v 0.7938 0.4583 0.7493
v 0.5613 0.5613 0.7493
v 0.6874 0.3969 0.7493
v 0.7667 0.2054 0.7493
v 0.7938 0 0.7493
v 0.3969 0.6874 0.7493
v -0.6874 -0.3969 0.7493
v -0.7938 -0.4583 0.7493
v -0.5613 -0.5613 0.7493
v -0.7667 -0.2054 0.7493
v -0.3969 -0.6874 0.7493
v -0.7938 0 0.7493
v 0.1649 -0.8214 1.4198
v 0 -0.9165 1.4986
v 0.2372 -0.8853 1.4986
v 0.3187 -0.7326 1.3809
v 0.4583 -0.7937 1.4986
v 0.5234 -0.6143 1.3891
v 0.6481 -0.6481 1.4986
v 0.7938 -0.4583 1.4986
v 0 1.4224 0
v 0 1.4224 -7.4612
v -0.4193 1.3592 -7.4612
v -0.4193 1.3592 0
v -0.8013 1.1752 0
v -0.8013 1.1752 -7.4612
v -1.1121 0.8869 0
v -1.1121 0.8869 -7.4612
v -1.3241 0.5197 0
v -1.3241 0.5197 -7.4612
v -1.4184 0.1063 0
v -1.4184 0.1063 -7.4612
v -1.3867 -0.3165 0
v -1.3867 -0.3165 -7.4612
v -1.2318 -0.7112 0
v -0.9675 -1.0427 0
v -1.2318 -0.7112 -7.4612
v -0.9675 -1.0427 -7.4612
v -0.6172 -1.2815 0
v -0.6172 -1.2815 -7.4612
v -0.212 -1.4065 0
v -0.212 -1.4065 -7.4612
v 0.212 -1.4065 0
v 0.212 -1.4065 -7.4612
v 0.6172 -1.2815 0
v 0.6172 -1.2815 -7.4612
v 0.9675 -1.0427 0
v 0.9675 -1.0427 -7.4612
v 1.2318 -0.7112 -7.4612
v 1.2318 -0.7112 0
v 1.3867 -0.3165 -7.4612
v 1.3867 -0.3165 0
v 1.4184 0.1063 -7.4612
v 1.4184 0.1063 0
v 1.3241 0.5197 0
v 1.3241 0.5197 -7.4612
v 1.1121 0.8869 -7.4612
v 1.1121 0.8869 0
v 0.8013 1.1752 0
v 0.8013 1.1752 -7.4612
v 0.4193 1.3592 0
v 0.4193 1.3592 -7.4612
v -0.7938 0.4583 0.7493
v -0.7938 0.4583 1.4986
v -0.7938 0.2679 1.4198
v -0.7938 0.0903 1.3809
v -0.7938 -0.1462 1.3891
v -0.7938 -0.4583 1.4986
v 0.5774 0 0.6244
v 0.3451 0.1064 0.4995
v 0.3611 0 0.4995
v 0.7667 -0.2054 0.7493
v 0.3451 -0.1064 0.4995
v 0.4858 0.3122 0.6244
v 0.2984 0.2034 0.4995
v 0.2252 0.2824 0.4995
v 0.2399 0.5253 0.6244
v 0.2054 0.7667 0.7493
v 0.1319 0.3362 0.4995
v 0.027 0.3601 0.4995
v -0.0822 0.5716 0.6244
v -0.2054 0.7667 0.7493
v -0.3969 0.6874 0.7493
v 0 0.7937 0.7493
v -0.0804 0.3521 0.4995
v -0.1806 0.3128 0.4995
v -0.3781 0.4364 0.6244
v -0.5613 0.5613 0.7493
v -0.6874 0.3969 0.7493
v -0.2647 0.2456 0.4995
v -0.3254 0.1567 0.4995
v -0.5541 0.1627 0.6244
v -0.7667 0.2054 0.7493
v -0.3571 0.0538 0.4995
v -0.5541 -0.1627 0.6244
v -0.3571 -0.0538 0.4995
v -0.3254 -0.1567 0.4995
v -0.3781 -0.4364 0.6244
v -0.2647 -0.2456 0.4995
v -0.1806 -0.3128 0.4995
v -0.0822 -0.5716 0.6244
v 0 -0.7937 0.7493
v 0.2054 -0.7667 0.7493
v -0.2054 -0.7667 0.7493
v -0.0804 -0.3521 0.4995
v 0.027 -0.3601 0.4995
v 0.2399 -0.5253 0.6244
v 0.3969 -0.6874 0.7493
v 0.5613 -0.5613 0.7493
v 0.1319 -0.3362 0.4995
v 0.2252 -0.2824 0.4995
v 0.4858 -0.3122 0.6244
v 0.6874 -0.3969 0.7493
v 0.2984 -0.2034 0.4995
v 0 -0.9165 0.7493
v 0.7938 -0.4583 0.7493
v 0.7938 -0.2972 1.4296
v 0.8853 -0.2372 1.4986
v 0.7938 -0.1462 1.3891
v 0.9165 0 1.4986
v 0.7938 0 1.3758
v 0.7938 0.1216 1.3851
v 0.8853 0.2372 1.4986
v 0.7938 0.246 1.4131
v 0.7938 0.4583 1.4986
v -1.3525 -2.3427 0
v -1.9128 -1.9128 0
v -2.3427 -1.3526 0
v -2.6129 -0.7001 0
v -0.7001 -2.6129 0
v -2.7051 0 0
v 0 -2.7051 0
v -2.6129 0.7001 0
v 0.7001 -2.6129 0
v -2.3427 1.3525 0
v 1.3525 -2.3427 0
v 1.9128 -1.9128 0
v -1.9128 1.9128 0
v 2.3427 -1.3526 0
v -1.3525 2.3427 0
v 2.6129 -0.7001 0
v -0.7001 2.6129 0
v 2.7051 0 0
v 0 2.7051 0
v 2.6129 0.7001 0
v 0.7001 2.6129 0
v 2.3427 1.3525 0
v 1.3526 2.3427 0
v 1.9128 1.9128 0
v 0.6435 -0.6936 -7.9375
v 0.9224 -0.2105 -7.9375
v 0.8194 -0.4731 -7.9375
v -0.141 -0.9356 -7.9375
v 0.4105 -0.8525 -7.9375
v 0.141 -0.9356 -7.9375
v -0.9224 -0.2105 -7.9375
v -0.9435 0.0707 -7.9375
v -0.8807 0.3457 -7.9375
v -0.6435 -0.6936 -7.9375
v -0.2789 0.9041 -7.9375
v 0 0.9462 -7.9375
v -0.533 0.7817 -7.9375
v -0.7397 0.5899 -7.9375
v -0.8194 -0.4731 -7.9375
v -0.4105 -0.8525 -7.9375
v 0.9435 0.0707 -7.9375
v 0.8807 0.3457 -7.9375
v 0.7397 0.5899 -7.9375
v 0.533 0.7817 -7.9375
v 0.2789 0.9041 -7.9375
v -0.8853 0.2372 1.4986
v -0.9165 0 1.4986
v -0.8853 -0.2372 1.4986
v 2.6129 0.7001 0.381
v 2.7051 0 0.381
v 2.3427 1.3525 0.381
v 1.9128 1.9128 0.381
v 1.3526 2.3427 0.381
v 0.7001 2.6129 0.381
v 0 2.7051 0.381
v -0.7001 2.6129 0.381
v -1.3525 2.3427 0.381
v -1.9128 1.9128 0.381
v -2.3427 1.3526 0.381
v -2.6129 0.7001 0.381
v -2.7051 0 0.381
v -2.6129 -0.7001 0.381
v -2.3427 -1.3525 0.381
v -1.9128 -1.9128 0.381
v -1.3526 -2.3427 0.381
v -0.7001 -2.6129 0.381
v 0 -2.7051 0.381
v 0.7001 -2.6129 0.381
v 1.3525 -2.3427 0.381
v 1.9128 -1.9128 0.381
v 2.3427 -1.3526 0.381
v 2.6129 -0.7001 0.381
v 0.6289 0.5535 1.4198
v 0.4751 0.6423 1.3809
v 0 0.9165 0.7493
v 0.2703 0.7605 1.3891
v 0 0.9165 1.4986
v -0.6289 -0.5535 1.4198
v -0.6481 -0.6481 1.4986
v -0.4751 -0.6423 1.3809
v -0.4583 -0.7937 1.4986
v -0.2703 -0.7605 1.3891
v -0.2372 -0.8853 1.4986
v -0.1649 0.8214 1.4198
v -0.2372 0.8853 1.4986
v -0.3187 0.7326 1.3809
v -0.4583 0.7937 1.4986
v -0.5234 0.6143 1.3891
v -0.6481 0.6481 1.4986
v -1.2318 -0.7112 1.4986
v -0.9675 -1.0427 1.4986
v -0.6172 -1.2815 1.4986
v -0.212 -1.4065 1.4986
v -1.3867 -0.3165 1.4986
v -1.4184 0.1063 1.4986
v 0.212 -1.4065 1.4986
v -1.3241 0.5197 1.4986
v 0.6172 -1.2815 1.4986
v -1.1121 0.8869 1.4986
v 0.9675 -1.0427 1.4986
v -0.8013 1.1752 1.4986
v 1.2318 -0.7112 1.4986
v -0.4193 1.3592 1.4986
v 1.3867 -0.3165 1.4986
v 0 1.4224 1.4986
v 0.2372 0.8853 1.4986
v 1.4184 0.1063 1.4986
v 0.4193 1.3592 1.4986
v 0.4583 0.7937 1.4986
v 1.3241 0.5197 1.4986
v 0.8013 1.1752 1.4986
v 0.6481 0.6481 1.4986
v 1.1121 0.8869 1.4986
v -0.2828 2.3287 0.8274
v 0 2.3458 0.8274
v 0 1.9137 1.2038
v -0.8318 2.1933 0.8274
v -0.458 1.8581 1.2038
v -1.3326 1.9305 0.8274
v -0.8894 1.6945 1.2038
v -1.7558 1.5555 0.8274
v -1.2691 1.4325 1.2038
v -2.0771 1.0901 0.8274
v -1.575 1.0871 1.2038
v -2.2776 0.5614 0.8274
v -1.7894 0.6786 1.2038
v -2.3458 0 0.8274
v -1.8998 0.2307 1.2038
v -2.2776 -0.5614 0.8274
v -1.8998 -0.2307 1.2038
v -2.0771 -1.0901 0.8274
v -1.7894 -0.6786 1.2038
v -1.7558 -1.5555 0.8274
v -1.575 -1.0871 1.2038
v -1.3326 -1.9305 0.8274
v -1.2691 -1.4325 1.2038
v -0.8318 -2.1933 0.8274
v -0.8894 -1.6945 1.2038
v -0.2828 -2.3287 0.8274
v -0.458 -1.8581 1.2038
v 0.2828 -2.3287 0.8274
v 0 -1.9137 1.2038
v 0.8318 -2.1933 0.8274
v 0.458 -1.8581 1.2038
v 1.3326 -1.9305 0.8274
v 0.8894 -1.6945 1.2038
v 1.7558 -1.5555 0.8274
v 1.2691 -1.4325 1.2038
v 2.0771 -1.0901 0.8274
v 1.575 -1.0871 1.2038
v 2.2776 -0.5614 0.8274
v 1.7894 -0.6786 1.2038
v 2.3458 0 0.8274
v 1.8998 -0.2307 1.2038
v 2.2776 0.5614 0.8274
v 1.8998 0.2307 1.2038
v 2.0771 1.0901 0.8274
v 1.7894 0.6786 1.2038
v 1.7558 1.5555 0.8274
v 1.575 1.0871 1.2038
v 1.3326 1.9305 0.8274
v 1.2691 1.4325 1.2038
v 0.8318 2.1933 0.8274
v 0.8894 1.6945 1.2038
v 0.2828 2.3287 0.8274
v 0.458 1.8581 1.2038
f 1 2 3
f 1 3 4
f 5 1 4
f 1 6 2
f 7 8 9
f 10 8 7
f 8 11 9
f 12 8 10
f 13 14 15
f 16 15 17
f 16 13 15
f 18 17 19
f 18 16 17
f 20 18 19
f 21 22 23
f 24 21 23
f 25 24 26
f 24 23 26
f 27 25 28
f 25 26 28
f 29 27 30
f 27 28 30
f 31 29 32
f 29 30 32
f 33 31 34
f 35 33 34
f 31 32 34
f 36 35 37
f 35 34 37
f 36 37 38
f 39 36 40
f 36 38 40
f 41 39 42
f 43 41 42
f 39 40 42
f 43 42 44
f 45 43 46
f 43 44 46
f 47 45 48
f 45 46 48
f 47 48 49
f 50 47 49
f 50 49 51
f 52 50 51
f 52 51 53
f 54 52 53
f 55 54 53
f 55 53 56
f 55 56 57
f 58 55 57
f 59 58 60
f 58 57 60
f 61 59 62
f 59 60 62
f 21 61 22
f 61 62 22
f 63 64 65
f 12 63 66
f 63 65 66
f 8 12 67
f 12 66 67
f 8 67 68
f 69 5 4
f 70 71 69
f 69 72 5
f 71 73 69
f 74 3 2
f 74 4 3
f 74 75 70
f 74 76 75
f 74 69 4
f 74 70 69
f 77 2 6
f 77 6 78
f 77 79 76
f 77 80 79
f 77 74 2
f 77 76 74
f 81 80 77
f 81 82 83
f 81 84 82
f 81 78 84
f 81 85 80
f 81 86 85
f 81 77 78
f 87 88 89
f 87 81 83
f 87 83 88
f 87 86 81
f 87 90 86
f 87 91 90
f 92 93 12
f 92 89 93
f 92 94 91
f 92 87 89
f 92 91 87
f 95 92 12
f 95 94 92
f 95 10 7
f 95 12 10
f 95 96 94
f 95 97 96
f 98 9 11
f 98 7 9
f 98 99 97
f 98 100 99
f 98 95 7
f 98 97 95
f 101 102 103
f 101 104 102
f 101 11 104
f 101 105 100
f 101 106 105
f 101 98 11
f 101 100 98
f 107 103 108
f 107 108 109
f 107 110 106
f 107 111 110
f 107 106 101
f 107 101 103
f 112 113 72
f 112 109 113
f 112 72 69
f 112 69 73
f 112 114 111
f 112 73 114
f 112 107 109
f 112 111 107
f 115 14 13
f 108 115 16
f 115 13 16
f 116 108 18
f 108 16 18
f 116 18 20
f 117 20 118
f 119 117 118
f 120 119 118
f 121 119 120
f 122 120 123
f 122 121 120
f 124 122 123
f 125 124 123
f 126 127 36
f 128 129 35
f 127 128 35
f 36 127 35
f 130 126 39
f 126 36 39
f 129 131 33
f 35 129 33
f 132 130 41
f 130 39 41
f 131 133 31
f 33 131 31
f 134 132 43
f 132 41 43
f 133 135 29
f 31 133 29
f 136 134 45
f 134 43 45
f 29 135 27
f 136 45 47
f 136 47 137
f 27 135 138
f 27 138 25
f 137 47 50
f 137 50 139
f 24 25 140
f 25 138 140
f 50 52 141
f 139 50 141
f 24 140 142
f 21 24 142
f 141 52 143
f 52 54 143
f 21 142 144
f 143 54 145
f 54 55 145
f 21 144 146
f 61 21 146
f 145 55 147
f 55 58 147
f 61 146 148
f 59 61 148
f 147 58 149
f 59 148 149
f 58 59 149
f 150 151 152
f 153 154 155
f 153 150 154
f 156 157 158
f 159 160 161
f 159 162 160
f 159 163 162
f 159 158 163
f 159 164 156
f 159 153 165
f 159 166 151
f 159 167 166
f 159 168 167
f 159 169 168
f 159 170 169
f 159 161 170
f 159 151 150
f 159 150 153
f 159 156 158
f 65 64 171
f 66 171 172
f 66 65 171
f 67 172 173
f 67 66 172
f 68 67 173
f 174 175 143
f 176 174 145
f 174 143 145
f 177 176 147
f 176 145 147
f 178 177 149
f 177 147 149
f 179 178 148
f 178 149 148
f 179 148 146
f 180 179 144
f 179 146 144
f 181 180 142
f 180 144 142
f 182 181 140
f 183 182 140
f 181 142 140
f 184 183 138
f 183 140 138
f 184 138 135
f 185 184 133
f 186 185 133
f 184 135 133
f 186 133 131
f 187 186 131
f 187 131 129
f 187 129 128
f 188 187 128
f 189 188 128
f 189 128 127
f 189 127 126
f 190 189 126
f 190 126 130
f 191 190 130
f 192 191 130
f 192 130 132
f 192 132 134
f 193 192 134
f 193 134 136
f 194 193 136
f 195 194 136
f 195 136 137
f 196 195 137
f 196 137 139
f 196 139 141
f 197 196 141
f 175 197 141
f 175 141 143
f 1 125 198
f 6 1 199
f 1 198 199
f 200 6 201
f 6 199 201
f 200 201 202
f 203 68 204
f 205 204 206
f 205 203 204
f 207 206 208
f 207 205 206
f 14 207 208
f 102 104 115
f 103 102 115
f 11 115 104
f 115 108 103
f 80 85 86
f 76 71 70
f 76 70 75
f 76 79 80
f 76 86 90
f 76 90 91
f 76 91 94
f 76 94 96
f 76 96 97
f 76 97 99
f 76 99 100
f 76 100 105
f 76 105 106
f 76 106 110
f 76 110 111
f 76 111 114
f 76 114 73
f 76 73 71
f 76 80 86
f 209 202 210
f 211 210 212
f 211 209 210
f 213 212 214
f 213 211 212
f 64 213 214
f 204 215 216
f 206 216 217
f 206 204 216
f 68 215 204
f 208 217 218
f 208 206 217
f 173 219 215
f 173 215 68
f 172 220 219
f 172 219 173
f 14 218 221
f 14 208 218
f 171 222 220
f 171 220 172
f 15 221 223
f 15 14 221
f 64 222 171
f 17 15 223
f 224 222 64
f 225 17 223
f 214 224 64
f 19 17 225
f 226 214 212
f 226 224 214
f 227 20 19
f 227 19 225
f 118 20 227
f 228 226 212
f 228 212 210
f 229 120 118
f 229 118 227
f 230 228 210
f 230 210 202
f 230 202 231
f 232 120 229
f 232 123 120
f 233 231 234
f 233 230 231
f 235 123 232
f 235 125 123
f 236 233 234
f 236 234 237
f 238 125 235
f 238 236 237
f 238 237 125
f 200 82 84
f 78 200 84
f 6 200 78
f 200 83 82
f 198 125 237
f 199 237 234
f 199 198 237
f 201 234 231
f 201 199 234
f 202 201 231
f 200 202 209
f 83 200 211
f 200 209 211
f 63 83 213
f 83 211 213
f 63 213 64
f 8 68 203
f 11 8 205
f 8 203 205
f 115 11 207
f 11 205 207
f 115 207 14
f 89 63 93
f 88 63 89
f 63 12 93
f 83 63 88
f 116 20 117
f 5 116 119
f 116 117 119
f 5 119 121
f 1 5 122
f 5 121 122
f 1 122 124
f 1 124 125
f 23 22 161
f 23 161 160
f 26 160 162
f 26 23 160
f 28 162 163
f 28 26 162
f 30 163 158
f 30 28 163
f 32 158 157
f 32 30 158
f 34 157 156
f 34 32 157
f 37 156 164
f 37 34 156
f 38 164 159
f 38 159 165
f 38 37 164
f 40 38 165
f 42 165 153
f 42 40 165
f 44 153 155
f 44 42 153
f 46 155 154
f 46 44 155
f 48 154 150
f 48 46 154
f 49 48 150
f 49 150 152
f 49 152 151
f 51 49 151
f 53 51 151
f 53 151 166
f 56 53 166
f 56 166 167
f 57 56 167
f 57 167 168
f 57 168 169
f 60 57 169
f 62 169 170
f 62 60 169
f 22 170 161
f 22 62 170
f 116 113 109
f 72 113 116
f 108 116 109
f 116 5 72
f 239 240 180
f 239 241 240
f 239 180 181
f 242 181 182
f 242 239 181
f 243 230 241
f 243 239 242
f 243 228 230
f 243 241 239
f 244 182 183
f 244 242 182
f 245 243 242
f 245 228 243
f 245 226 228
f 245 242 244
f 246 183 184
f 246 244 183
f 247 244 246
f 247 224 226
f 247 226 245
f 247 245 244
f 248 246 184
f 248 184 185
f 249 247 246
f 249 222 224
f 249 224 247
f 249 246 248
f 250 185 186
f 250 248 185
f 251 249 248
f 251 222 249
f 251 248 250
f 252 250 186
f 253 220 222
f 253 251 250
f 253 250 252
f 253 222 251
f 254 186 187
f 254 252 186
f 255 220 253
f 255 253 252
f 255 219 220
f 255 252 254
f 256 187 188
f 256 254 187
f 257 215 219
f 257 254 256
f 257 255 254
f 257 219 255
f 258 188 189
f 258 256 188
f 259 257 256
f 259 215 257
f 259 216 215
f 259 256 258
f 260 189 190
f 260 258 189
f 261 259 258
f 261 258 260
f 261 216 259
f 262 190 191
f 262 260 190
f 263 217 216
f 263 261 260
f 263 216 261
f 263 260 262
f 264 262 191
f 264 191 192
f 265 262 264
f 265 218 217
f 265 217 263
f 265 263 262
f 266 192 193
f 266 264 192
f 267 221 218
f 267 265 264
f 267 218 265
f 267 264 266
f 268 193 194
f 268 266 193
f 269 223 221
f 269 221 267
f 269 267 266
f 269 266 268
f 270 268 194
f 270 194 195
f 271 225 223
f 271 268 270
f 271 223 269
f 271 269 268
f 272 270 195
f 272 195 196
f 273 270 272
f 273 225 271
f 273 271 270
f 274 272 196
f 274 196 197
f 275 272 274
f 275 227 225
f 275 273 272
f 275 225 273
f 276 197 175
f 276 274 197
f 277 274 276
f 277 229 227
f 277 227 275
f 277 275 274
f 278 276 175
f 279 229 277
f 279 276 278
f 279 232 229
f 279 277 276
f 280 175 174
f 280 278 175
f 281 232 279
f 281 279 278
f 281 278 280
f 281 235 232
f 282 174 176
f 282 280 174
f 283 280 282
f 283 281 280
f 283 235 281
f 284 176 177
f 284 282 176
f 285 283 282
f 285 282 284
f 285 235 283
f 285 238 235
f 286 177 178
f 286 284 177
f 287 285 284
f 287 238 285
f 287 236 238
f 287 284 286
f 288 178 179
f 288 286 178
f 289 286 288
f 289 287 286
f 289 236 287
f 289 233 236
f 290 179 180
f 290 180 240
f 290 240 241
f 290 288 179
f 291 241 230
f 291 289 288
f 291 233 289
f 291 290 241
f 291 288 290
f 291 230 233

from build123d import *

# Parameters (mm, degrees)
SKETCH1_W          = 7.9375
SKETCH1_H          = 1.4224
CHAMFER1_SIZE      = 0.47625
SKETCH4_R          = 2.7051
EXTRUDE1_DEPTH     = 1.4986
CUT_EXTRUDE1_DEPTH = 0.7493
SKETCH7_R          = 0.916543552
CUT_EXTRUDE4_DEPTH = 0.7493
CUT_EXTRUDE4_TAPER = 45
SKETCH8_R          = 0.79375
CUT_EXTRUDE5_DEPTH = 0.249766667
CUT_EXTRUDE5_TAPER = 60


with BuildPart() as part:
    # Sketch1 → Revolve1 (revolve)
    with BuildSketch(Plane(origin=(0, 0, 0), x_dir=(0, 0, -1), z_dir=(1, 0, 0))):
        with Locations((3.96875, 0.7112)):
            Rectangle(SKETCH1_W, SKETCH1_H)
    revolve(axis=Axis((0, 0, 0), (0, 0, 1)))

    # Chamfer1
    chamfer1_edges = [part.edges().sort_by_distance(p)[0] for p in [
        (0, -1.4224, -7.9375),
    ]]
    chamfer(chamfer1_edges, length=CHAMFER1_SIZE)

    # Sketch4 → Extrude1 (add)
    with BuildSketch(Plane.XY):
        Circle(SKETCH4_R)
    extrude(amount=EXTRUDE1_DEPTH)

    # Sketch9 → Cut-Revolve3 (revolve, cut)
    with BuildSketch(Plane(origin=(0, 0, 0), x_dir=(0, 0, -1), z_dir=(1, 0, 0))):
        with BuildLine():
            Line((0, 2.7051), (-0.381, 2.7051))
            ThreePointArc((-0.381, 2.7051), (-1.025093234, 2.138064897), (-1.4986, 1.4224))
            Line((-1.4986, 1.4224), (-1.8796, 1.4224))
            Line((-1.8796, 1.4224), (-1.8796, 3.0861))
            Line((-1.8796, 3.0861), (0, 3.0861))
            Line((0, 3.0861), (0, 2.7051))
        make_face()
    revolve(axis=Axis((0, 0, 0), (0, 0, 1)), mode=Mode.SUBTRACT)

    # Sketch6 → Cut-Extrude1 (cut)
    with BuildSketch(Plane.XY.offset(1.4986)):
        Polygon((0, -0.916543552), (0.79375, -0.458271776), (0.79375, 0.458271776), (0, 0.916543552), (-0.79375, 0.458271776), (-0.79375, -0.458271776), align=None)
    extrude(amount=-CUT_EXTRUDE1_DEPTH, mode=Mode.SUBTRACT)

    # Sketch7 → Cut-Extrude4 (cut)
    with BuildSketch(Plane.XY.offset(1.4986)):
        Circle(SKETCH7_R)
    extrude(amount=-CUT_EXTRUDE4_DEPTH, taper=CUT_EXTRUDE4_TAPER, mode=Mode.SUBTRACT)

    # Sketch8 → Cut-Extrude5 (cut)
    with BuildSketch(Plane.XY.offset(0.7493)):
        Circle(SKETCH8_R)
    extrude(amount=-CUT_EXTRUDE5_DEPTH, taper=CUT_EXTRUDE5_TAPER, mode=Mode.SUBTRACT)


solid = part.part
